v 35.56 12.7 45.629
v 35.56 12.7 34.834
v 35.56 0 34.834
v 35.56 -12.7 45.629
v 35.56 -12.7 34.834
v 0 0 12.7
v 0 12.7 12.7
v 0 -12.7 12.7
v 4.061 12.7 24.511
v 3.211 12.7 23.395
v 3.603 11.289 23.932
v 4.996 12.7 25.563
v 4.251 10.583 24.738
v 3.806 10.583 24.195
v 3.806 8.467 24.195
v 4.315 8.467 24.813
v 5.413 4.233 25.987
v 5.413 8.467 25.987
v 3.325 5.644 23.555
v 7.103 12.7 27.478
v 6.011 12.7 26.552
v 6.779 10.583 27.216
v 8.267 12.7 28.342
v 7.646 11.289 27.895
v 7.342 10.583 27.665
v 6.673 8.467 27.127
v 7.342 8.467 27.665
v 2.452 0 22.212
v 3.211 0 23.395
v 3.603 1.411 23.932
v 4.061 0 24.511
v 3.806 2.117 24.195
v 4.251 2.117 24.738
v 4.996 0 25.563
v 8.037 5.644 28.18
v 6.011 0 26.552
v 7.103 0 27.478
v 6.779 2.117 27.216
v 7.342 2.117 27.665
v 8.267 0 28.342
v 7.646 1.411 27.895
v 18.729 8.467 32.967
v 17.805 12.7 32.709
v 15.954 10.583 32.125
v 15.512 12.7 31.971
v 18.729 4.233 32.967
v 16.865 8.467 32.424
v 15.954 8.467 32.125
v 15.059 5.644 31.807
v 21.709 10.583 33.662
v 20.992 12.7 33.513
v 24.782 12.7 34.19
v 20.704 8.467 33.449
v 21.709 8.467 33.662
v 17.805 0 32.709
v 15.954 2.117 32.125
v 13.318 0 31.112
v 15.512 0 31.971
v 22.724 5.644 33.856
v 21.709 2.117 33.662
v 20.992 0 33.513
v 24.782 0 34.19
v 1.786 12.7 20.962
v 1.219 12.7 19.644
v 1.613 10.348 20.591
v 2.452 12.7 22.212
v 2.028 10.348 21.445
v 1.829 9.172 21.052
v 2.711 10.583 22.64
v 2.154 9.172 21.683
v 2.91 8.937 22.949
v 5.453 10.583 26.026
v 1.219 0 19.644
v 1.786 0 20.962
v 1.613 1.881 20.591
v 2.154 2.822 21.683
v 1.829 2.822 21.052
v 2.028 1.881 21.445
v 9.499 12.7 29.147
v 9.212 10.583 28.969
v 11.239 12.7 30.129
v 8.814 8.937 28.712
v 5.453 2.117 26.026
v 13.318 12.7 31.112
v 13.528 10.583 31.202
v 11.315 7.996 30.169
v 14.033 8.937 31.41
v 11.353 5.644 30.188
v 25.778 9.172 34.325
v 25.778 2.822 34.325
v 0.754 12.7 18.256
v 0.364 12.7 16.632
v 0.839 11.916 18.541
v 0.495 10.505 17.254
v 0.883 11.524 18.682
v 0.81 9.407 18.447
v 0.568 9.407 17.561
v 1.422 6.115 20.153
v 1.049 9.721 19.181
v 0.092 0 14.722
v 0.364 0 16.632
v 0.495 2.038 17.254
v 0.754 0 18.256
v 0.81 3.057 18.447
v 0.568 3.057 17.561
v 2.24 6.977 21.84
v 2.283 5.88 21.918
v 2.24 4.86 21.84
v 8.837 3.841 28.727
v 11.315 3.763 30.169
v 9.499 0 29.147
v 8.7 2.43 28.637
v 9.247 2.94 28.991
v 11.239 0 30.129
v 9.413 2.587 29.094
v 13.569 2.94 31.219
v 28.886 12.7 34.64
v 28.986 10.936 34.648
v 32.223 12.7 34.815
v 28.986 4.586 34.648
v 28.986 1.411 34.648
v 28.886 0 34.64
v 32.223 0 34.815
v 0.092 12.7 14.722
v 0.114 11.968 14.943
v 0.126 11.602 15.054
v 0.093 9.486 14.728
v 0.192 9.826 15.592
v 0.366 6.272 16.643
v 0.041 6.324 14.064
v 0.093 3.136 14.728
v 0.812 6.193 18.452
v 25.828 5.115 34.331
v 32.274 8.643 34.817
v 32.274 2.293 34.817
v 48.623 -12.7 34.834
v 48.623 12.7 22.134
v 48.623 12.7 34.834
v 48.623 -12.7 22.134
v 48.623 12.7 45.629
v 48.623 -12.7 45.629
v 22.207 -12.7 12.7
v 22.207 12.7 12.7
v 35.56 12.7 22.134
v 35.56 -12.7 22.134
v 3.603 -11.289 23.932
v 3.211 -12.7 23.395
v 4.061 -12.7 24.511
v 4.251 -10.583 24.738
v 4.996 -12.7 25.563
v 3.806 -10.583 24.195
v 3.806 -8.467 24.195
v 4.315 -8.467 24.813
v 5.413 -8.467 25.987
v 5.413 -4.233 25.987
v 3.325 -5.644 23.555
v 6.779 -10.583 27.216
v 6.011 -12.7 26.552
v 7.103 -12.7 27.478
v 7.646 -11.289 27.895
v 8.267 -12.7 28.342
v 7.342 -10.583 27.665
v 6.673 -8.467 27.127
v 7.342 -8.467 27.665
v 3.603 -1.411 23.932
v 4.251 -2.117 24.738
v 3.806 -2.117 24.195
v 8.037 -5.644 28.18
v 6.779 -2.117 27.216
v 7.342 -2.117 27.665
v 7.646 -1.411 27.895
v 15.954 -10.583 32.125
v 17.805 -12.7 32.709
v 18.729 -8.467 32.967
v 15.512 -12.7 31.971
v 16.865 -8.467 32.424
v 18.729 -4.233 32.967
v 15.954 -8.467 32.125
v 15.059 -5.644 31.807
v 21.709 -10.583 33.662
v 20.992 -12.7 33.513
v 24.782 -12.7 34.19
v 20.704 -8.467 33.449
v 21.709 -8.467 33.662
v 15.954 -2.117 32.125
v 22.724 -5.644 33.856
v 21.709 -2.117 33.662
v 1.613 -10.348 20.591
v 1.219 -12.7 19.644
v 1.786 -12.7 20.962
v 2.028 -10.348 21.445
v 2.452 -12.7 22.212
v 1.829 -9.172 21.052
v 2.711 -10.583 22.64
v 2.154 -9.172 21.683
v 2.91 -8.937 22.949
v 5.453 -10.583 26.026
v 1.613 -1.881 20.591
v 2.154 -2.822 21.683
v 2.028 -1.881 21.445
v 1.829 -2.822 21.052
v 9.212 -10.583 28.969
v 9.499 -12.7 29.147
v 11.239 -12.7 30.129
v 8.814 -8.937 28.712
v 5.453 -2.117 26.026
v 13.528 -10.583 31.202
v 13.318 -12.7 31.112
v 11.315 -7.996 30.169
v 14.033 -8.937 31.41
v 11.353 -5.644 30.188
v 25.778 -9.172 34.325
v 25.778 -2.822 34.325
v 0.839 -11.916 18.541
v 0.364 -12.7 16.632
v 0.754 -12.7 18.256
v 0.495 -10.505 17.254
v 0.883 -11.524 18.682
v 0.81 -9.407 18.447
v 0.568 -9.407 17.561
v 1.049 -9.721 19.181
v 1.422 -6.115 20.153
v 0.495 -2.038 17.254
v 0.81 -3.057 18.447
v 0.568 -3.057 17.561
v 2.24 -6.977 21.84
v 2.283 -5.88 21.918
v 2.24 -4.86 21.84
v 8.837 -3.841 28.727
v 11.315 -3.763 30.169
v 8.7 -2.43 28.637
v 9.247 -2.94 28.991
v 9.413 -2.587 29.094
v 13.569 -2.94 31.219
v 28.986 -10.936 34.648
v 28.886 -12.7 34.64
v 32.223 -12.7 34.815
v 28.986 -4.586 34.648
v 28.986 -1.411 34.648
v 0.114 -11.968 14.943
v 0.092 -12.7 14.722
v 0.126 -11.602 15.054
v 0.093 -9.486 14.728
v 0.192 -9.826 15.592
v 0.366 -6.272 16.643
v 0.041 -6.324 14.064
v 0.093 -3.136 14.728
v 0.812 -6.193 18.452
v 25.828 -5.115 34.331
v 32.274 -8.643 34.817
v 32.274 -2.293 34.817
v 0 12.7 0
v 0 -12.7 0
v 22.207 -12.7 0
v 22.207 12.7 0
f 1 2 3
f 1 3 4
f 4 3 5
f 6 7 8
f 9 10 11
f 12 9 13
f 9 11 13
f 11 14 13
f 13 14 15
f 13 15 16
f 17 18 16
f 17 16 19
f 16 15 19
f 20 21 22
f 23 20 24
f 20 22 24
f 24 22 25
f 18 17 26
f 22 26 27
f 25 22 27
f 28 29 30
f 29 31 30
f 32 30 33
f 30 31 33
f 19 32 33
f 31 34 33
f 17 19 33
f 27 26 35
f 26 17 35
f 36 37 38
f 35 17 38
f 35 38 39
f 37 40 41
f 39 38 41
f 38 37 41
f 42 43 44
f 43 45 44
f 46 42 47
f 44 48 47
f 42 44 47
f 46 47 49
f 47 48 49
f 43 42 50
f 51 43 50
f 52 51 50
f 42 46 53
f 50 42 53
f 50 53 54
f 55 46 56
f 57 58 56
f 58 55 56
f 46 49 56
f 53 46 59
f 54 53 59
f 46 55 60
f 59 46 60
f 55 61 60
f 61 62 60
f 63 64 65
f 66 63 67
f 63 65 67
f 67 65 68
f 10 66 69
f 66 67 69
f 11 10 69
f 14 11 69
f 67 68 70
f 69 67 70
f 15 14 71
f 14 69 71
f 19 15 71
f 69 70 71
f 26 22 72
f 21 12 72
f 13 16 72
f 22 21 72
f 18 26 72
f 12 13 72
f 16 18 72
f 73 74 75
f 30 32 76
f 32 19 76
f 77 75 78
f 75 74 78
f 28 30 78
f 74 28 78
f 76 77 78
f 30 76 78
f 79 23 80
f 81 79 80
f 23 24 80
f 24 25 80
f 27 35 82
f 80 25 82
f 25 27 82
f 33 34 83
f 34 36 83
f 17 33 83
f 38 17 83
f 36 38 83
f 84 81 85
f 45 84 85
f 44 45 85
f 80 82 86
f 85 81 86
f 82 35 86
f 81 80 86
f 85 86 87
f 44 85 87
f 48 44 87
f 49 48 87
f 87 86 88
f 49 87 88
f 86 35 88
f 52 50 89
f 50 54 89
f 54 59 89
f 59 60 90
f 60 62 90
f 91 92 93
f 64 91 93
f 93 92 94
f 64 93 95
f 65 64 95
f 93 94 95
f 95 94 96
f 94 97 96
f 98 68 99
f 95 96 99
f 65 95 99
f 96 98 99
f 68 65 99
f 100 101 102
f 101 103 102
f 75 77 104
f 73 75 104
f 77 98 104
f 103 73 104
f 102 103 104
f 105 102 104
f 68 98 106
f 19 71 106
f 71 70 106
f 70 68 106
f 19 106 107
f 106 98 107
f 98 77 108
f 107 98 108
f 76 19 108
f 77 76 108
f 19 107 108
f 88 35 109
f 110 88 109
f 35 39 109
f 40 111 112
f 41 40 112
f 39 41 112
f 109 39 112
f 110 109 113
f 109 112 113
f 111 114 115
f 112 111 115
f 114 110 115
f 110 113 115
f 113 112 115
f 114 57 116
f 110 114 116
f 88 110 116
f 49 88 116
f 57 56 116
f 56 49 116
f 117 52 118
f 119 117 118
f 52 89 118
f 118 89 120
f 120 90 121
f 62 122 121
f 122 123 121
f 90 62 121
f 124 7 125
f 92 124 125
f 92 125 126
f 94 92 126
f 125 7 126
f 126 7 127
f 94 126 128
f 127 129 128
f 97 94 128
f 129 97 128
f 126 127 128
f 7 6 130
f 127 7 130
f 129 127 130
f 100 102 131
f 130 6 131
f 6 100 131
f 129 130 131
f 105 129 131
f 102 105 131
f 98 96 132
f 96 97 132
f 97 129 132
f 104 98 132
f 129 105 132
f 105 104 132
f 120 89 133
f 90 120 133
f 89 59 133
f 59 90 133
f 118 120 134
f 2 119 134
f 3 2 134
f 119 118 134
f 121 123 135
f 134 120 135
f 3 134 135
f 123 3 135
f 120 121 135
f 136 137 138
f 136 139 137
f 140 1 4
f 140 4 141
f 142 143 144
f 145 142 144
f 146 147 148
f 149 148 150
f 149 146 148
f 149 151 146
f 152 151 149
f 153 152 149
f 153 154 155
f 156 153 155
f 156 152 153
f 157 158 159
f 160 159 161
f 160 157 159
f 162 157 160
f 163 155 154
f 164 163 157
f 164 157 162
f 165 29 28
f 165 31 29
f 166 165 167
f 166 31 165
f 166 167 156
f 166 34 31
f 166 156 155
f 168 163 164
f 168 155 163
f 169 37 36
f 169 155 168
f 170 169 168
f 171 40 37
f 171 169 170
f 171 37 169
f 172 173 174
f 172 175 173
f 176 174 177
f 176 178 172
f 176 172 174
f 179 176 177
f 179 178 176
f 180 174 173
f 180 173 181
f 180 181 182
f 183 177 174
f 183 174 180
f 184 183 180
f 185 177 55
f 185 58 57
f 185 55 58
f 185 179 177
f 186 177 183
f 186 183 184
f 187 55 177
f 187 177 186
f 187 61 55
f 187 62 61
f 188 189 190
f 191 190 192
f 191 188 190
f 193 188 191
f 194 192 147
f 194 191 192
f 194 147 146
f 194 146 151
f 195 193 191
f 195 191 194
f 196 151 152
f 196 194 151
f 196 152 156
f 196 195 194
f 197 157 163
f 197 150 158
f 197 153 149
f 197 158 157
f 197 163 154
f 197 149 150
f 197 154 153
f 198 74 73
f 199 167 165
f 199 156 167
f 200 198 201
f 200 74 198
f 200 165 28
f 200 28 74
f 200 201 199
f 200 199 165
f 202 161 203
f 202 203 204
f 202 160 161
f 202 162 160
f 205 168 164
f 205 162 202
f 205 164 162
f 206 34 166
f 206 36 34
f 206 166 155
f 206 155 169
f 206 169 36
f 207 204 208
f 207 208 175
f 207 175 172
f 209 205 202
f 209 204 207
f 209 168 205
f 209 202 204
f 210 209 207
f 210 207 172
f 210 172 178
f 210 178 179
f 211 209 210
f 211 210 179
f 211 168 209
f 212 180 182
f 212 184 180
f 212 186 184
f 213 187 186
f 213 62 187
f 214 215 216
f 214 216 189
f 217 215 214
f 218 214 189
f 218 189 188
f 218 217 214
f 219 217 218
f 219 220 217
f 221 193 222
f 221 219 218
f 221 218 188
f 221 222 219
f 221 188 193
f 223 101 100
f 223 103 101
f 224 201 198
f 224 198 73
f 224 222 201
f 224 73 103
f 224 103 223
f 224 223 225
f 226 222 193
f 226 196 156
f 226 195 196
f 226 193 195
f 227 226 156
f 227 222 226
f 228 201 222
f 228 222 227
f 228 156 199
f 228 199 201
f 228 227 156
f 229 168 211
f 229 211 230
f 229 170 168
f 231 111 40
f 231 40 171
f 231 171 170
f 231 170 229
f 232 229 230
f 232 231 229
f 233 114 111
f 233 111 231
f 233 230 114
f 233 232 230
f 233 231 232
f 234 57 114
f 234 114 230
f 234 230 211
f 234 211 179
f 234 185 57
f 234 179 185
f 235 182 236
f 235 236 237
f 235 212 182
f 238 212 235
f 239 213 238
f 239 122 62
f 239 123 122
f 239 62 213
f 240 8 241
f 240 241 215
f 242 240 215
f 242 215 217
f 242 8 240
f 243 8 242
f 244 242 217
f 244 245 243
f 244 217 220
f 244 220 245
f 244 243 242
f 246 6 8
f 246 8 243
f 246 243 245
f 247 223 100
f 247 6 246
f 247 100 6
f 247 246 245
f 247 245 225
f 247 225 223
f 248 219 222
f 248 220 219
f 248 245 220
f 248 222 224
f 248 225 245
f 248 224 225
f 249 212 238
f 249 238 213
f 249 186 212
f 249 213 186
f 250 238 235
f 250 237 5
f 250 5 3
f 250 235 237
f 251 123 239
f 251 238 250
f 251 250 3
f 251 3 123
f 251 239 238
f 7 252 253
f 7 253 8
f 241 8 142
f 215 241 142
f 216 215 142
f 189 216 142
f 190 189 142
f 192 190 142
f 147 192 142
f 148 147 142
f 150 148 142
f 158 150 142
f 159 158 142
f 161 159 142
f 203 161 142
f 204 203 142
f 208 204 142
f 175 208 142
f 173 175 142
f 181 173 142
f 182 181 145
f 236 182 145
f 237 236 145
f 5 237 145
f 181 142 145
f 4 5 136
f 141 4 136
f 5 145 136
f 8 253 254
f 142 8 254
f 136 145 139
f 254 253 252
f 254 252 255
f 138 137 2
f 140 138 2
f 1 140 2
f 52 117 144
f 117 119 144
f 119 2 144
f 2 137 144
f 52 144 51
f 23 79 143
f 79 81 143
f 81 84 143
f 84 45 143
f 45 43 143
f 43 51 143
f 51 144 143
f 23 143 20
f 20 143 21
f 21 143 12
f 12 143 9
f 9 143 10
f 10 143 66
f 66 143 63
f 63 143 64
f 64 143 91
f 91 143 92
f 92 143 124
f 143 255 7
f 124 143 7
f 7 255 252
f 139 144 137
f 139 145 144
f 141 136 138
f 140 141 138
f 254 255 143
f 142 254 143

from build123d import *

# Parameters (mm, degrees)
F0_W     = 22.206857
F0_H     = 12.7
F0_W_2   = 13.062857
F1_DEPTH = 12.7
F2_DEPTH = 10.795


with BuildPart() as f1:
    # F0 (on Front) → F1 (new body, symmetric)
    with BuildSketch(Plane.XZ):
        with BuildLine():
            add(Edge.make_bspline(
                [(0, 12.7), (0, 29.538335), (18.433142, 35.12457), (35.559997, 34.834284)],
                knots=[0, 0, 0, 0, 41.886035, 41.886035, 41.886035, 41.886035], degree=3))
            Line((0, 12.7), (22.206857, 12.7))
            Line((22.206857, 12.7), (35.559997, 22.134284))
            Line((35.559997, 22.134284), (35.559997, 34.834284))
        make_face()
        with Locations((11.103428, 6.35)):
            Rectangle(F0_W, F0_H)
        with Locations((42.091425, 28.484284)):
            Rectangle(F0_W_2, F0_H)
    extrude(amount=F1_DEPTH, both=True)

    # F1_face (on face) → F2 (join)
    with BuildSketch(Plane(origin=(42.091425, 0, 34.834284), x_dir=(1, 0, 0), z_dir=(0, 0, 1))):
        Polygon((6.531428, -12.7), (6.531428, 12.7), (-6.531428, 12.7), (-6.531428, 0), (-6.531428, -12.7), align=None)
    extrude(amount=F2_DEPTH)


solid = f1.part
